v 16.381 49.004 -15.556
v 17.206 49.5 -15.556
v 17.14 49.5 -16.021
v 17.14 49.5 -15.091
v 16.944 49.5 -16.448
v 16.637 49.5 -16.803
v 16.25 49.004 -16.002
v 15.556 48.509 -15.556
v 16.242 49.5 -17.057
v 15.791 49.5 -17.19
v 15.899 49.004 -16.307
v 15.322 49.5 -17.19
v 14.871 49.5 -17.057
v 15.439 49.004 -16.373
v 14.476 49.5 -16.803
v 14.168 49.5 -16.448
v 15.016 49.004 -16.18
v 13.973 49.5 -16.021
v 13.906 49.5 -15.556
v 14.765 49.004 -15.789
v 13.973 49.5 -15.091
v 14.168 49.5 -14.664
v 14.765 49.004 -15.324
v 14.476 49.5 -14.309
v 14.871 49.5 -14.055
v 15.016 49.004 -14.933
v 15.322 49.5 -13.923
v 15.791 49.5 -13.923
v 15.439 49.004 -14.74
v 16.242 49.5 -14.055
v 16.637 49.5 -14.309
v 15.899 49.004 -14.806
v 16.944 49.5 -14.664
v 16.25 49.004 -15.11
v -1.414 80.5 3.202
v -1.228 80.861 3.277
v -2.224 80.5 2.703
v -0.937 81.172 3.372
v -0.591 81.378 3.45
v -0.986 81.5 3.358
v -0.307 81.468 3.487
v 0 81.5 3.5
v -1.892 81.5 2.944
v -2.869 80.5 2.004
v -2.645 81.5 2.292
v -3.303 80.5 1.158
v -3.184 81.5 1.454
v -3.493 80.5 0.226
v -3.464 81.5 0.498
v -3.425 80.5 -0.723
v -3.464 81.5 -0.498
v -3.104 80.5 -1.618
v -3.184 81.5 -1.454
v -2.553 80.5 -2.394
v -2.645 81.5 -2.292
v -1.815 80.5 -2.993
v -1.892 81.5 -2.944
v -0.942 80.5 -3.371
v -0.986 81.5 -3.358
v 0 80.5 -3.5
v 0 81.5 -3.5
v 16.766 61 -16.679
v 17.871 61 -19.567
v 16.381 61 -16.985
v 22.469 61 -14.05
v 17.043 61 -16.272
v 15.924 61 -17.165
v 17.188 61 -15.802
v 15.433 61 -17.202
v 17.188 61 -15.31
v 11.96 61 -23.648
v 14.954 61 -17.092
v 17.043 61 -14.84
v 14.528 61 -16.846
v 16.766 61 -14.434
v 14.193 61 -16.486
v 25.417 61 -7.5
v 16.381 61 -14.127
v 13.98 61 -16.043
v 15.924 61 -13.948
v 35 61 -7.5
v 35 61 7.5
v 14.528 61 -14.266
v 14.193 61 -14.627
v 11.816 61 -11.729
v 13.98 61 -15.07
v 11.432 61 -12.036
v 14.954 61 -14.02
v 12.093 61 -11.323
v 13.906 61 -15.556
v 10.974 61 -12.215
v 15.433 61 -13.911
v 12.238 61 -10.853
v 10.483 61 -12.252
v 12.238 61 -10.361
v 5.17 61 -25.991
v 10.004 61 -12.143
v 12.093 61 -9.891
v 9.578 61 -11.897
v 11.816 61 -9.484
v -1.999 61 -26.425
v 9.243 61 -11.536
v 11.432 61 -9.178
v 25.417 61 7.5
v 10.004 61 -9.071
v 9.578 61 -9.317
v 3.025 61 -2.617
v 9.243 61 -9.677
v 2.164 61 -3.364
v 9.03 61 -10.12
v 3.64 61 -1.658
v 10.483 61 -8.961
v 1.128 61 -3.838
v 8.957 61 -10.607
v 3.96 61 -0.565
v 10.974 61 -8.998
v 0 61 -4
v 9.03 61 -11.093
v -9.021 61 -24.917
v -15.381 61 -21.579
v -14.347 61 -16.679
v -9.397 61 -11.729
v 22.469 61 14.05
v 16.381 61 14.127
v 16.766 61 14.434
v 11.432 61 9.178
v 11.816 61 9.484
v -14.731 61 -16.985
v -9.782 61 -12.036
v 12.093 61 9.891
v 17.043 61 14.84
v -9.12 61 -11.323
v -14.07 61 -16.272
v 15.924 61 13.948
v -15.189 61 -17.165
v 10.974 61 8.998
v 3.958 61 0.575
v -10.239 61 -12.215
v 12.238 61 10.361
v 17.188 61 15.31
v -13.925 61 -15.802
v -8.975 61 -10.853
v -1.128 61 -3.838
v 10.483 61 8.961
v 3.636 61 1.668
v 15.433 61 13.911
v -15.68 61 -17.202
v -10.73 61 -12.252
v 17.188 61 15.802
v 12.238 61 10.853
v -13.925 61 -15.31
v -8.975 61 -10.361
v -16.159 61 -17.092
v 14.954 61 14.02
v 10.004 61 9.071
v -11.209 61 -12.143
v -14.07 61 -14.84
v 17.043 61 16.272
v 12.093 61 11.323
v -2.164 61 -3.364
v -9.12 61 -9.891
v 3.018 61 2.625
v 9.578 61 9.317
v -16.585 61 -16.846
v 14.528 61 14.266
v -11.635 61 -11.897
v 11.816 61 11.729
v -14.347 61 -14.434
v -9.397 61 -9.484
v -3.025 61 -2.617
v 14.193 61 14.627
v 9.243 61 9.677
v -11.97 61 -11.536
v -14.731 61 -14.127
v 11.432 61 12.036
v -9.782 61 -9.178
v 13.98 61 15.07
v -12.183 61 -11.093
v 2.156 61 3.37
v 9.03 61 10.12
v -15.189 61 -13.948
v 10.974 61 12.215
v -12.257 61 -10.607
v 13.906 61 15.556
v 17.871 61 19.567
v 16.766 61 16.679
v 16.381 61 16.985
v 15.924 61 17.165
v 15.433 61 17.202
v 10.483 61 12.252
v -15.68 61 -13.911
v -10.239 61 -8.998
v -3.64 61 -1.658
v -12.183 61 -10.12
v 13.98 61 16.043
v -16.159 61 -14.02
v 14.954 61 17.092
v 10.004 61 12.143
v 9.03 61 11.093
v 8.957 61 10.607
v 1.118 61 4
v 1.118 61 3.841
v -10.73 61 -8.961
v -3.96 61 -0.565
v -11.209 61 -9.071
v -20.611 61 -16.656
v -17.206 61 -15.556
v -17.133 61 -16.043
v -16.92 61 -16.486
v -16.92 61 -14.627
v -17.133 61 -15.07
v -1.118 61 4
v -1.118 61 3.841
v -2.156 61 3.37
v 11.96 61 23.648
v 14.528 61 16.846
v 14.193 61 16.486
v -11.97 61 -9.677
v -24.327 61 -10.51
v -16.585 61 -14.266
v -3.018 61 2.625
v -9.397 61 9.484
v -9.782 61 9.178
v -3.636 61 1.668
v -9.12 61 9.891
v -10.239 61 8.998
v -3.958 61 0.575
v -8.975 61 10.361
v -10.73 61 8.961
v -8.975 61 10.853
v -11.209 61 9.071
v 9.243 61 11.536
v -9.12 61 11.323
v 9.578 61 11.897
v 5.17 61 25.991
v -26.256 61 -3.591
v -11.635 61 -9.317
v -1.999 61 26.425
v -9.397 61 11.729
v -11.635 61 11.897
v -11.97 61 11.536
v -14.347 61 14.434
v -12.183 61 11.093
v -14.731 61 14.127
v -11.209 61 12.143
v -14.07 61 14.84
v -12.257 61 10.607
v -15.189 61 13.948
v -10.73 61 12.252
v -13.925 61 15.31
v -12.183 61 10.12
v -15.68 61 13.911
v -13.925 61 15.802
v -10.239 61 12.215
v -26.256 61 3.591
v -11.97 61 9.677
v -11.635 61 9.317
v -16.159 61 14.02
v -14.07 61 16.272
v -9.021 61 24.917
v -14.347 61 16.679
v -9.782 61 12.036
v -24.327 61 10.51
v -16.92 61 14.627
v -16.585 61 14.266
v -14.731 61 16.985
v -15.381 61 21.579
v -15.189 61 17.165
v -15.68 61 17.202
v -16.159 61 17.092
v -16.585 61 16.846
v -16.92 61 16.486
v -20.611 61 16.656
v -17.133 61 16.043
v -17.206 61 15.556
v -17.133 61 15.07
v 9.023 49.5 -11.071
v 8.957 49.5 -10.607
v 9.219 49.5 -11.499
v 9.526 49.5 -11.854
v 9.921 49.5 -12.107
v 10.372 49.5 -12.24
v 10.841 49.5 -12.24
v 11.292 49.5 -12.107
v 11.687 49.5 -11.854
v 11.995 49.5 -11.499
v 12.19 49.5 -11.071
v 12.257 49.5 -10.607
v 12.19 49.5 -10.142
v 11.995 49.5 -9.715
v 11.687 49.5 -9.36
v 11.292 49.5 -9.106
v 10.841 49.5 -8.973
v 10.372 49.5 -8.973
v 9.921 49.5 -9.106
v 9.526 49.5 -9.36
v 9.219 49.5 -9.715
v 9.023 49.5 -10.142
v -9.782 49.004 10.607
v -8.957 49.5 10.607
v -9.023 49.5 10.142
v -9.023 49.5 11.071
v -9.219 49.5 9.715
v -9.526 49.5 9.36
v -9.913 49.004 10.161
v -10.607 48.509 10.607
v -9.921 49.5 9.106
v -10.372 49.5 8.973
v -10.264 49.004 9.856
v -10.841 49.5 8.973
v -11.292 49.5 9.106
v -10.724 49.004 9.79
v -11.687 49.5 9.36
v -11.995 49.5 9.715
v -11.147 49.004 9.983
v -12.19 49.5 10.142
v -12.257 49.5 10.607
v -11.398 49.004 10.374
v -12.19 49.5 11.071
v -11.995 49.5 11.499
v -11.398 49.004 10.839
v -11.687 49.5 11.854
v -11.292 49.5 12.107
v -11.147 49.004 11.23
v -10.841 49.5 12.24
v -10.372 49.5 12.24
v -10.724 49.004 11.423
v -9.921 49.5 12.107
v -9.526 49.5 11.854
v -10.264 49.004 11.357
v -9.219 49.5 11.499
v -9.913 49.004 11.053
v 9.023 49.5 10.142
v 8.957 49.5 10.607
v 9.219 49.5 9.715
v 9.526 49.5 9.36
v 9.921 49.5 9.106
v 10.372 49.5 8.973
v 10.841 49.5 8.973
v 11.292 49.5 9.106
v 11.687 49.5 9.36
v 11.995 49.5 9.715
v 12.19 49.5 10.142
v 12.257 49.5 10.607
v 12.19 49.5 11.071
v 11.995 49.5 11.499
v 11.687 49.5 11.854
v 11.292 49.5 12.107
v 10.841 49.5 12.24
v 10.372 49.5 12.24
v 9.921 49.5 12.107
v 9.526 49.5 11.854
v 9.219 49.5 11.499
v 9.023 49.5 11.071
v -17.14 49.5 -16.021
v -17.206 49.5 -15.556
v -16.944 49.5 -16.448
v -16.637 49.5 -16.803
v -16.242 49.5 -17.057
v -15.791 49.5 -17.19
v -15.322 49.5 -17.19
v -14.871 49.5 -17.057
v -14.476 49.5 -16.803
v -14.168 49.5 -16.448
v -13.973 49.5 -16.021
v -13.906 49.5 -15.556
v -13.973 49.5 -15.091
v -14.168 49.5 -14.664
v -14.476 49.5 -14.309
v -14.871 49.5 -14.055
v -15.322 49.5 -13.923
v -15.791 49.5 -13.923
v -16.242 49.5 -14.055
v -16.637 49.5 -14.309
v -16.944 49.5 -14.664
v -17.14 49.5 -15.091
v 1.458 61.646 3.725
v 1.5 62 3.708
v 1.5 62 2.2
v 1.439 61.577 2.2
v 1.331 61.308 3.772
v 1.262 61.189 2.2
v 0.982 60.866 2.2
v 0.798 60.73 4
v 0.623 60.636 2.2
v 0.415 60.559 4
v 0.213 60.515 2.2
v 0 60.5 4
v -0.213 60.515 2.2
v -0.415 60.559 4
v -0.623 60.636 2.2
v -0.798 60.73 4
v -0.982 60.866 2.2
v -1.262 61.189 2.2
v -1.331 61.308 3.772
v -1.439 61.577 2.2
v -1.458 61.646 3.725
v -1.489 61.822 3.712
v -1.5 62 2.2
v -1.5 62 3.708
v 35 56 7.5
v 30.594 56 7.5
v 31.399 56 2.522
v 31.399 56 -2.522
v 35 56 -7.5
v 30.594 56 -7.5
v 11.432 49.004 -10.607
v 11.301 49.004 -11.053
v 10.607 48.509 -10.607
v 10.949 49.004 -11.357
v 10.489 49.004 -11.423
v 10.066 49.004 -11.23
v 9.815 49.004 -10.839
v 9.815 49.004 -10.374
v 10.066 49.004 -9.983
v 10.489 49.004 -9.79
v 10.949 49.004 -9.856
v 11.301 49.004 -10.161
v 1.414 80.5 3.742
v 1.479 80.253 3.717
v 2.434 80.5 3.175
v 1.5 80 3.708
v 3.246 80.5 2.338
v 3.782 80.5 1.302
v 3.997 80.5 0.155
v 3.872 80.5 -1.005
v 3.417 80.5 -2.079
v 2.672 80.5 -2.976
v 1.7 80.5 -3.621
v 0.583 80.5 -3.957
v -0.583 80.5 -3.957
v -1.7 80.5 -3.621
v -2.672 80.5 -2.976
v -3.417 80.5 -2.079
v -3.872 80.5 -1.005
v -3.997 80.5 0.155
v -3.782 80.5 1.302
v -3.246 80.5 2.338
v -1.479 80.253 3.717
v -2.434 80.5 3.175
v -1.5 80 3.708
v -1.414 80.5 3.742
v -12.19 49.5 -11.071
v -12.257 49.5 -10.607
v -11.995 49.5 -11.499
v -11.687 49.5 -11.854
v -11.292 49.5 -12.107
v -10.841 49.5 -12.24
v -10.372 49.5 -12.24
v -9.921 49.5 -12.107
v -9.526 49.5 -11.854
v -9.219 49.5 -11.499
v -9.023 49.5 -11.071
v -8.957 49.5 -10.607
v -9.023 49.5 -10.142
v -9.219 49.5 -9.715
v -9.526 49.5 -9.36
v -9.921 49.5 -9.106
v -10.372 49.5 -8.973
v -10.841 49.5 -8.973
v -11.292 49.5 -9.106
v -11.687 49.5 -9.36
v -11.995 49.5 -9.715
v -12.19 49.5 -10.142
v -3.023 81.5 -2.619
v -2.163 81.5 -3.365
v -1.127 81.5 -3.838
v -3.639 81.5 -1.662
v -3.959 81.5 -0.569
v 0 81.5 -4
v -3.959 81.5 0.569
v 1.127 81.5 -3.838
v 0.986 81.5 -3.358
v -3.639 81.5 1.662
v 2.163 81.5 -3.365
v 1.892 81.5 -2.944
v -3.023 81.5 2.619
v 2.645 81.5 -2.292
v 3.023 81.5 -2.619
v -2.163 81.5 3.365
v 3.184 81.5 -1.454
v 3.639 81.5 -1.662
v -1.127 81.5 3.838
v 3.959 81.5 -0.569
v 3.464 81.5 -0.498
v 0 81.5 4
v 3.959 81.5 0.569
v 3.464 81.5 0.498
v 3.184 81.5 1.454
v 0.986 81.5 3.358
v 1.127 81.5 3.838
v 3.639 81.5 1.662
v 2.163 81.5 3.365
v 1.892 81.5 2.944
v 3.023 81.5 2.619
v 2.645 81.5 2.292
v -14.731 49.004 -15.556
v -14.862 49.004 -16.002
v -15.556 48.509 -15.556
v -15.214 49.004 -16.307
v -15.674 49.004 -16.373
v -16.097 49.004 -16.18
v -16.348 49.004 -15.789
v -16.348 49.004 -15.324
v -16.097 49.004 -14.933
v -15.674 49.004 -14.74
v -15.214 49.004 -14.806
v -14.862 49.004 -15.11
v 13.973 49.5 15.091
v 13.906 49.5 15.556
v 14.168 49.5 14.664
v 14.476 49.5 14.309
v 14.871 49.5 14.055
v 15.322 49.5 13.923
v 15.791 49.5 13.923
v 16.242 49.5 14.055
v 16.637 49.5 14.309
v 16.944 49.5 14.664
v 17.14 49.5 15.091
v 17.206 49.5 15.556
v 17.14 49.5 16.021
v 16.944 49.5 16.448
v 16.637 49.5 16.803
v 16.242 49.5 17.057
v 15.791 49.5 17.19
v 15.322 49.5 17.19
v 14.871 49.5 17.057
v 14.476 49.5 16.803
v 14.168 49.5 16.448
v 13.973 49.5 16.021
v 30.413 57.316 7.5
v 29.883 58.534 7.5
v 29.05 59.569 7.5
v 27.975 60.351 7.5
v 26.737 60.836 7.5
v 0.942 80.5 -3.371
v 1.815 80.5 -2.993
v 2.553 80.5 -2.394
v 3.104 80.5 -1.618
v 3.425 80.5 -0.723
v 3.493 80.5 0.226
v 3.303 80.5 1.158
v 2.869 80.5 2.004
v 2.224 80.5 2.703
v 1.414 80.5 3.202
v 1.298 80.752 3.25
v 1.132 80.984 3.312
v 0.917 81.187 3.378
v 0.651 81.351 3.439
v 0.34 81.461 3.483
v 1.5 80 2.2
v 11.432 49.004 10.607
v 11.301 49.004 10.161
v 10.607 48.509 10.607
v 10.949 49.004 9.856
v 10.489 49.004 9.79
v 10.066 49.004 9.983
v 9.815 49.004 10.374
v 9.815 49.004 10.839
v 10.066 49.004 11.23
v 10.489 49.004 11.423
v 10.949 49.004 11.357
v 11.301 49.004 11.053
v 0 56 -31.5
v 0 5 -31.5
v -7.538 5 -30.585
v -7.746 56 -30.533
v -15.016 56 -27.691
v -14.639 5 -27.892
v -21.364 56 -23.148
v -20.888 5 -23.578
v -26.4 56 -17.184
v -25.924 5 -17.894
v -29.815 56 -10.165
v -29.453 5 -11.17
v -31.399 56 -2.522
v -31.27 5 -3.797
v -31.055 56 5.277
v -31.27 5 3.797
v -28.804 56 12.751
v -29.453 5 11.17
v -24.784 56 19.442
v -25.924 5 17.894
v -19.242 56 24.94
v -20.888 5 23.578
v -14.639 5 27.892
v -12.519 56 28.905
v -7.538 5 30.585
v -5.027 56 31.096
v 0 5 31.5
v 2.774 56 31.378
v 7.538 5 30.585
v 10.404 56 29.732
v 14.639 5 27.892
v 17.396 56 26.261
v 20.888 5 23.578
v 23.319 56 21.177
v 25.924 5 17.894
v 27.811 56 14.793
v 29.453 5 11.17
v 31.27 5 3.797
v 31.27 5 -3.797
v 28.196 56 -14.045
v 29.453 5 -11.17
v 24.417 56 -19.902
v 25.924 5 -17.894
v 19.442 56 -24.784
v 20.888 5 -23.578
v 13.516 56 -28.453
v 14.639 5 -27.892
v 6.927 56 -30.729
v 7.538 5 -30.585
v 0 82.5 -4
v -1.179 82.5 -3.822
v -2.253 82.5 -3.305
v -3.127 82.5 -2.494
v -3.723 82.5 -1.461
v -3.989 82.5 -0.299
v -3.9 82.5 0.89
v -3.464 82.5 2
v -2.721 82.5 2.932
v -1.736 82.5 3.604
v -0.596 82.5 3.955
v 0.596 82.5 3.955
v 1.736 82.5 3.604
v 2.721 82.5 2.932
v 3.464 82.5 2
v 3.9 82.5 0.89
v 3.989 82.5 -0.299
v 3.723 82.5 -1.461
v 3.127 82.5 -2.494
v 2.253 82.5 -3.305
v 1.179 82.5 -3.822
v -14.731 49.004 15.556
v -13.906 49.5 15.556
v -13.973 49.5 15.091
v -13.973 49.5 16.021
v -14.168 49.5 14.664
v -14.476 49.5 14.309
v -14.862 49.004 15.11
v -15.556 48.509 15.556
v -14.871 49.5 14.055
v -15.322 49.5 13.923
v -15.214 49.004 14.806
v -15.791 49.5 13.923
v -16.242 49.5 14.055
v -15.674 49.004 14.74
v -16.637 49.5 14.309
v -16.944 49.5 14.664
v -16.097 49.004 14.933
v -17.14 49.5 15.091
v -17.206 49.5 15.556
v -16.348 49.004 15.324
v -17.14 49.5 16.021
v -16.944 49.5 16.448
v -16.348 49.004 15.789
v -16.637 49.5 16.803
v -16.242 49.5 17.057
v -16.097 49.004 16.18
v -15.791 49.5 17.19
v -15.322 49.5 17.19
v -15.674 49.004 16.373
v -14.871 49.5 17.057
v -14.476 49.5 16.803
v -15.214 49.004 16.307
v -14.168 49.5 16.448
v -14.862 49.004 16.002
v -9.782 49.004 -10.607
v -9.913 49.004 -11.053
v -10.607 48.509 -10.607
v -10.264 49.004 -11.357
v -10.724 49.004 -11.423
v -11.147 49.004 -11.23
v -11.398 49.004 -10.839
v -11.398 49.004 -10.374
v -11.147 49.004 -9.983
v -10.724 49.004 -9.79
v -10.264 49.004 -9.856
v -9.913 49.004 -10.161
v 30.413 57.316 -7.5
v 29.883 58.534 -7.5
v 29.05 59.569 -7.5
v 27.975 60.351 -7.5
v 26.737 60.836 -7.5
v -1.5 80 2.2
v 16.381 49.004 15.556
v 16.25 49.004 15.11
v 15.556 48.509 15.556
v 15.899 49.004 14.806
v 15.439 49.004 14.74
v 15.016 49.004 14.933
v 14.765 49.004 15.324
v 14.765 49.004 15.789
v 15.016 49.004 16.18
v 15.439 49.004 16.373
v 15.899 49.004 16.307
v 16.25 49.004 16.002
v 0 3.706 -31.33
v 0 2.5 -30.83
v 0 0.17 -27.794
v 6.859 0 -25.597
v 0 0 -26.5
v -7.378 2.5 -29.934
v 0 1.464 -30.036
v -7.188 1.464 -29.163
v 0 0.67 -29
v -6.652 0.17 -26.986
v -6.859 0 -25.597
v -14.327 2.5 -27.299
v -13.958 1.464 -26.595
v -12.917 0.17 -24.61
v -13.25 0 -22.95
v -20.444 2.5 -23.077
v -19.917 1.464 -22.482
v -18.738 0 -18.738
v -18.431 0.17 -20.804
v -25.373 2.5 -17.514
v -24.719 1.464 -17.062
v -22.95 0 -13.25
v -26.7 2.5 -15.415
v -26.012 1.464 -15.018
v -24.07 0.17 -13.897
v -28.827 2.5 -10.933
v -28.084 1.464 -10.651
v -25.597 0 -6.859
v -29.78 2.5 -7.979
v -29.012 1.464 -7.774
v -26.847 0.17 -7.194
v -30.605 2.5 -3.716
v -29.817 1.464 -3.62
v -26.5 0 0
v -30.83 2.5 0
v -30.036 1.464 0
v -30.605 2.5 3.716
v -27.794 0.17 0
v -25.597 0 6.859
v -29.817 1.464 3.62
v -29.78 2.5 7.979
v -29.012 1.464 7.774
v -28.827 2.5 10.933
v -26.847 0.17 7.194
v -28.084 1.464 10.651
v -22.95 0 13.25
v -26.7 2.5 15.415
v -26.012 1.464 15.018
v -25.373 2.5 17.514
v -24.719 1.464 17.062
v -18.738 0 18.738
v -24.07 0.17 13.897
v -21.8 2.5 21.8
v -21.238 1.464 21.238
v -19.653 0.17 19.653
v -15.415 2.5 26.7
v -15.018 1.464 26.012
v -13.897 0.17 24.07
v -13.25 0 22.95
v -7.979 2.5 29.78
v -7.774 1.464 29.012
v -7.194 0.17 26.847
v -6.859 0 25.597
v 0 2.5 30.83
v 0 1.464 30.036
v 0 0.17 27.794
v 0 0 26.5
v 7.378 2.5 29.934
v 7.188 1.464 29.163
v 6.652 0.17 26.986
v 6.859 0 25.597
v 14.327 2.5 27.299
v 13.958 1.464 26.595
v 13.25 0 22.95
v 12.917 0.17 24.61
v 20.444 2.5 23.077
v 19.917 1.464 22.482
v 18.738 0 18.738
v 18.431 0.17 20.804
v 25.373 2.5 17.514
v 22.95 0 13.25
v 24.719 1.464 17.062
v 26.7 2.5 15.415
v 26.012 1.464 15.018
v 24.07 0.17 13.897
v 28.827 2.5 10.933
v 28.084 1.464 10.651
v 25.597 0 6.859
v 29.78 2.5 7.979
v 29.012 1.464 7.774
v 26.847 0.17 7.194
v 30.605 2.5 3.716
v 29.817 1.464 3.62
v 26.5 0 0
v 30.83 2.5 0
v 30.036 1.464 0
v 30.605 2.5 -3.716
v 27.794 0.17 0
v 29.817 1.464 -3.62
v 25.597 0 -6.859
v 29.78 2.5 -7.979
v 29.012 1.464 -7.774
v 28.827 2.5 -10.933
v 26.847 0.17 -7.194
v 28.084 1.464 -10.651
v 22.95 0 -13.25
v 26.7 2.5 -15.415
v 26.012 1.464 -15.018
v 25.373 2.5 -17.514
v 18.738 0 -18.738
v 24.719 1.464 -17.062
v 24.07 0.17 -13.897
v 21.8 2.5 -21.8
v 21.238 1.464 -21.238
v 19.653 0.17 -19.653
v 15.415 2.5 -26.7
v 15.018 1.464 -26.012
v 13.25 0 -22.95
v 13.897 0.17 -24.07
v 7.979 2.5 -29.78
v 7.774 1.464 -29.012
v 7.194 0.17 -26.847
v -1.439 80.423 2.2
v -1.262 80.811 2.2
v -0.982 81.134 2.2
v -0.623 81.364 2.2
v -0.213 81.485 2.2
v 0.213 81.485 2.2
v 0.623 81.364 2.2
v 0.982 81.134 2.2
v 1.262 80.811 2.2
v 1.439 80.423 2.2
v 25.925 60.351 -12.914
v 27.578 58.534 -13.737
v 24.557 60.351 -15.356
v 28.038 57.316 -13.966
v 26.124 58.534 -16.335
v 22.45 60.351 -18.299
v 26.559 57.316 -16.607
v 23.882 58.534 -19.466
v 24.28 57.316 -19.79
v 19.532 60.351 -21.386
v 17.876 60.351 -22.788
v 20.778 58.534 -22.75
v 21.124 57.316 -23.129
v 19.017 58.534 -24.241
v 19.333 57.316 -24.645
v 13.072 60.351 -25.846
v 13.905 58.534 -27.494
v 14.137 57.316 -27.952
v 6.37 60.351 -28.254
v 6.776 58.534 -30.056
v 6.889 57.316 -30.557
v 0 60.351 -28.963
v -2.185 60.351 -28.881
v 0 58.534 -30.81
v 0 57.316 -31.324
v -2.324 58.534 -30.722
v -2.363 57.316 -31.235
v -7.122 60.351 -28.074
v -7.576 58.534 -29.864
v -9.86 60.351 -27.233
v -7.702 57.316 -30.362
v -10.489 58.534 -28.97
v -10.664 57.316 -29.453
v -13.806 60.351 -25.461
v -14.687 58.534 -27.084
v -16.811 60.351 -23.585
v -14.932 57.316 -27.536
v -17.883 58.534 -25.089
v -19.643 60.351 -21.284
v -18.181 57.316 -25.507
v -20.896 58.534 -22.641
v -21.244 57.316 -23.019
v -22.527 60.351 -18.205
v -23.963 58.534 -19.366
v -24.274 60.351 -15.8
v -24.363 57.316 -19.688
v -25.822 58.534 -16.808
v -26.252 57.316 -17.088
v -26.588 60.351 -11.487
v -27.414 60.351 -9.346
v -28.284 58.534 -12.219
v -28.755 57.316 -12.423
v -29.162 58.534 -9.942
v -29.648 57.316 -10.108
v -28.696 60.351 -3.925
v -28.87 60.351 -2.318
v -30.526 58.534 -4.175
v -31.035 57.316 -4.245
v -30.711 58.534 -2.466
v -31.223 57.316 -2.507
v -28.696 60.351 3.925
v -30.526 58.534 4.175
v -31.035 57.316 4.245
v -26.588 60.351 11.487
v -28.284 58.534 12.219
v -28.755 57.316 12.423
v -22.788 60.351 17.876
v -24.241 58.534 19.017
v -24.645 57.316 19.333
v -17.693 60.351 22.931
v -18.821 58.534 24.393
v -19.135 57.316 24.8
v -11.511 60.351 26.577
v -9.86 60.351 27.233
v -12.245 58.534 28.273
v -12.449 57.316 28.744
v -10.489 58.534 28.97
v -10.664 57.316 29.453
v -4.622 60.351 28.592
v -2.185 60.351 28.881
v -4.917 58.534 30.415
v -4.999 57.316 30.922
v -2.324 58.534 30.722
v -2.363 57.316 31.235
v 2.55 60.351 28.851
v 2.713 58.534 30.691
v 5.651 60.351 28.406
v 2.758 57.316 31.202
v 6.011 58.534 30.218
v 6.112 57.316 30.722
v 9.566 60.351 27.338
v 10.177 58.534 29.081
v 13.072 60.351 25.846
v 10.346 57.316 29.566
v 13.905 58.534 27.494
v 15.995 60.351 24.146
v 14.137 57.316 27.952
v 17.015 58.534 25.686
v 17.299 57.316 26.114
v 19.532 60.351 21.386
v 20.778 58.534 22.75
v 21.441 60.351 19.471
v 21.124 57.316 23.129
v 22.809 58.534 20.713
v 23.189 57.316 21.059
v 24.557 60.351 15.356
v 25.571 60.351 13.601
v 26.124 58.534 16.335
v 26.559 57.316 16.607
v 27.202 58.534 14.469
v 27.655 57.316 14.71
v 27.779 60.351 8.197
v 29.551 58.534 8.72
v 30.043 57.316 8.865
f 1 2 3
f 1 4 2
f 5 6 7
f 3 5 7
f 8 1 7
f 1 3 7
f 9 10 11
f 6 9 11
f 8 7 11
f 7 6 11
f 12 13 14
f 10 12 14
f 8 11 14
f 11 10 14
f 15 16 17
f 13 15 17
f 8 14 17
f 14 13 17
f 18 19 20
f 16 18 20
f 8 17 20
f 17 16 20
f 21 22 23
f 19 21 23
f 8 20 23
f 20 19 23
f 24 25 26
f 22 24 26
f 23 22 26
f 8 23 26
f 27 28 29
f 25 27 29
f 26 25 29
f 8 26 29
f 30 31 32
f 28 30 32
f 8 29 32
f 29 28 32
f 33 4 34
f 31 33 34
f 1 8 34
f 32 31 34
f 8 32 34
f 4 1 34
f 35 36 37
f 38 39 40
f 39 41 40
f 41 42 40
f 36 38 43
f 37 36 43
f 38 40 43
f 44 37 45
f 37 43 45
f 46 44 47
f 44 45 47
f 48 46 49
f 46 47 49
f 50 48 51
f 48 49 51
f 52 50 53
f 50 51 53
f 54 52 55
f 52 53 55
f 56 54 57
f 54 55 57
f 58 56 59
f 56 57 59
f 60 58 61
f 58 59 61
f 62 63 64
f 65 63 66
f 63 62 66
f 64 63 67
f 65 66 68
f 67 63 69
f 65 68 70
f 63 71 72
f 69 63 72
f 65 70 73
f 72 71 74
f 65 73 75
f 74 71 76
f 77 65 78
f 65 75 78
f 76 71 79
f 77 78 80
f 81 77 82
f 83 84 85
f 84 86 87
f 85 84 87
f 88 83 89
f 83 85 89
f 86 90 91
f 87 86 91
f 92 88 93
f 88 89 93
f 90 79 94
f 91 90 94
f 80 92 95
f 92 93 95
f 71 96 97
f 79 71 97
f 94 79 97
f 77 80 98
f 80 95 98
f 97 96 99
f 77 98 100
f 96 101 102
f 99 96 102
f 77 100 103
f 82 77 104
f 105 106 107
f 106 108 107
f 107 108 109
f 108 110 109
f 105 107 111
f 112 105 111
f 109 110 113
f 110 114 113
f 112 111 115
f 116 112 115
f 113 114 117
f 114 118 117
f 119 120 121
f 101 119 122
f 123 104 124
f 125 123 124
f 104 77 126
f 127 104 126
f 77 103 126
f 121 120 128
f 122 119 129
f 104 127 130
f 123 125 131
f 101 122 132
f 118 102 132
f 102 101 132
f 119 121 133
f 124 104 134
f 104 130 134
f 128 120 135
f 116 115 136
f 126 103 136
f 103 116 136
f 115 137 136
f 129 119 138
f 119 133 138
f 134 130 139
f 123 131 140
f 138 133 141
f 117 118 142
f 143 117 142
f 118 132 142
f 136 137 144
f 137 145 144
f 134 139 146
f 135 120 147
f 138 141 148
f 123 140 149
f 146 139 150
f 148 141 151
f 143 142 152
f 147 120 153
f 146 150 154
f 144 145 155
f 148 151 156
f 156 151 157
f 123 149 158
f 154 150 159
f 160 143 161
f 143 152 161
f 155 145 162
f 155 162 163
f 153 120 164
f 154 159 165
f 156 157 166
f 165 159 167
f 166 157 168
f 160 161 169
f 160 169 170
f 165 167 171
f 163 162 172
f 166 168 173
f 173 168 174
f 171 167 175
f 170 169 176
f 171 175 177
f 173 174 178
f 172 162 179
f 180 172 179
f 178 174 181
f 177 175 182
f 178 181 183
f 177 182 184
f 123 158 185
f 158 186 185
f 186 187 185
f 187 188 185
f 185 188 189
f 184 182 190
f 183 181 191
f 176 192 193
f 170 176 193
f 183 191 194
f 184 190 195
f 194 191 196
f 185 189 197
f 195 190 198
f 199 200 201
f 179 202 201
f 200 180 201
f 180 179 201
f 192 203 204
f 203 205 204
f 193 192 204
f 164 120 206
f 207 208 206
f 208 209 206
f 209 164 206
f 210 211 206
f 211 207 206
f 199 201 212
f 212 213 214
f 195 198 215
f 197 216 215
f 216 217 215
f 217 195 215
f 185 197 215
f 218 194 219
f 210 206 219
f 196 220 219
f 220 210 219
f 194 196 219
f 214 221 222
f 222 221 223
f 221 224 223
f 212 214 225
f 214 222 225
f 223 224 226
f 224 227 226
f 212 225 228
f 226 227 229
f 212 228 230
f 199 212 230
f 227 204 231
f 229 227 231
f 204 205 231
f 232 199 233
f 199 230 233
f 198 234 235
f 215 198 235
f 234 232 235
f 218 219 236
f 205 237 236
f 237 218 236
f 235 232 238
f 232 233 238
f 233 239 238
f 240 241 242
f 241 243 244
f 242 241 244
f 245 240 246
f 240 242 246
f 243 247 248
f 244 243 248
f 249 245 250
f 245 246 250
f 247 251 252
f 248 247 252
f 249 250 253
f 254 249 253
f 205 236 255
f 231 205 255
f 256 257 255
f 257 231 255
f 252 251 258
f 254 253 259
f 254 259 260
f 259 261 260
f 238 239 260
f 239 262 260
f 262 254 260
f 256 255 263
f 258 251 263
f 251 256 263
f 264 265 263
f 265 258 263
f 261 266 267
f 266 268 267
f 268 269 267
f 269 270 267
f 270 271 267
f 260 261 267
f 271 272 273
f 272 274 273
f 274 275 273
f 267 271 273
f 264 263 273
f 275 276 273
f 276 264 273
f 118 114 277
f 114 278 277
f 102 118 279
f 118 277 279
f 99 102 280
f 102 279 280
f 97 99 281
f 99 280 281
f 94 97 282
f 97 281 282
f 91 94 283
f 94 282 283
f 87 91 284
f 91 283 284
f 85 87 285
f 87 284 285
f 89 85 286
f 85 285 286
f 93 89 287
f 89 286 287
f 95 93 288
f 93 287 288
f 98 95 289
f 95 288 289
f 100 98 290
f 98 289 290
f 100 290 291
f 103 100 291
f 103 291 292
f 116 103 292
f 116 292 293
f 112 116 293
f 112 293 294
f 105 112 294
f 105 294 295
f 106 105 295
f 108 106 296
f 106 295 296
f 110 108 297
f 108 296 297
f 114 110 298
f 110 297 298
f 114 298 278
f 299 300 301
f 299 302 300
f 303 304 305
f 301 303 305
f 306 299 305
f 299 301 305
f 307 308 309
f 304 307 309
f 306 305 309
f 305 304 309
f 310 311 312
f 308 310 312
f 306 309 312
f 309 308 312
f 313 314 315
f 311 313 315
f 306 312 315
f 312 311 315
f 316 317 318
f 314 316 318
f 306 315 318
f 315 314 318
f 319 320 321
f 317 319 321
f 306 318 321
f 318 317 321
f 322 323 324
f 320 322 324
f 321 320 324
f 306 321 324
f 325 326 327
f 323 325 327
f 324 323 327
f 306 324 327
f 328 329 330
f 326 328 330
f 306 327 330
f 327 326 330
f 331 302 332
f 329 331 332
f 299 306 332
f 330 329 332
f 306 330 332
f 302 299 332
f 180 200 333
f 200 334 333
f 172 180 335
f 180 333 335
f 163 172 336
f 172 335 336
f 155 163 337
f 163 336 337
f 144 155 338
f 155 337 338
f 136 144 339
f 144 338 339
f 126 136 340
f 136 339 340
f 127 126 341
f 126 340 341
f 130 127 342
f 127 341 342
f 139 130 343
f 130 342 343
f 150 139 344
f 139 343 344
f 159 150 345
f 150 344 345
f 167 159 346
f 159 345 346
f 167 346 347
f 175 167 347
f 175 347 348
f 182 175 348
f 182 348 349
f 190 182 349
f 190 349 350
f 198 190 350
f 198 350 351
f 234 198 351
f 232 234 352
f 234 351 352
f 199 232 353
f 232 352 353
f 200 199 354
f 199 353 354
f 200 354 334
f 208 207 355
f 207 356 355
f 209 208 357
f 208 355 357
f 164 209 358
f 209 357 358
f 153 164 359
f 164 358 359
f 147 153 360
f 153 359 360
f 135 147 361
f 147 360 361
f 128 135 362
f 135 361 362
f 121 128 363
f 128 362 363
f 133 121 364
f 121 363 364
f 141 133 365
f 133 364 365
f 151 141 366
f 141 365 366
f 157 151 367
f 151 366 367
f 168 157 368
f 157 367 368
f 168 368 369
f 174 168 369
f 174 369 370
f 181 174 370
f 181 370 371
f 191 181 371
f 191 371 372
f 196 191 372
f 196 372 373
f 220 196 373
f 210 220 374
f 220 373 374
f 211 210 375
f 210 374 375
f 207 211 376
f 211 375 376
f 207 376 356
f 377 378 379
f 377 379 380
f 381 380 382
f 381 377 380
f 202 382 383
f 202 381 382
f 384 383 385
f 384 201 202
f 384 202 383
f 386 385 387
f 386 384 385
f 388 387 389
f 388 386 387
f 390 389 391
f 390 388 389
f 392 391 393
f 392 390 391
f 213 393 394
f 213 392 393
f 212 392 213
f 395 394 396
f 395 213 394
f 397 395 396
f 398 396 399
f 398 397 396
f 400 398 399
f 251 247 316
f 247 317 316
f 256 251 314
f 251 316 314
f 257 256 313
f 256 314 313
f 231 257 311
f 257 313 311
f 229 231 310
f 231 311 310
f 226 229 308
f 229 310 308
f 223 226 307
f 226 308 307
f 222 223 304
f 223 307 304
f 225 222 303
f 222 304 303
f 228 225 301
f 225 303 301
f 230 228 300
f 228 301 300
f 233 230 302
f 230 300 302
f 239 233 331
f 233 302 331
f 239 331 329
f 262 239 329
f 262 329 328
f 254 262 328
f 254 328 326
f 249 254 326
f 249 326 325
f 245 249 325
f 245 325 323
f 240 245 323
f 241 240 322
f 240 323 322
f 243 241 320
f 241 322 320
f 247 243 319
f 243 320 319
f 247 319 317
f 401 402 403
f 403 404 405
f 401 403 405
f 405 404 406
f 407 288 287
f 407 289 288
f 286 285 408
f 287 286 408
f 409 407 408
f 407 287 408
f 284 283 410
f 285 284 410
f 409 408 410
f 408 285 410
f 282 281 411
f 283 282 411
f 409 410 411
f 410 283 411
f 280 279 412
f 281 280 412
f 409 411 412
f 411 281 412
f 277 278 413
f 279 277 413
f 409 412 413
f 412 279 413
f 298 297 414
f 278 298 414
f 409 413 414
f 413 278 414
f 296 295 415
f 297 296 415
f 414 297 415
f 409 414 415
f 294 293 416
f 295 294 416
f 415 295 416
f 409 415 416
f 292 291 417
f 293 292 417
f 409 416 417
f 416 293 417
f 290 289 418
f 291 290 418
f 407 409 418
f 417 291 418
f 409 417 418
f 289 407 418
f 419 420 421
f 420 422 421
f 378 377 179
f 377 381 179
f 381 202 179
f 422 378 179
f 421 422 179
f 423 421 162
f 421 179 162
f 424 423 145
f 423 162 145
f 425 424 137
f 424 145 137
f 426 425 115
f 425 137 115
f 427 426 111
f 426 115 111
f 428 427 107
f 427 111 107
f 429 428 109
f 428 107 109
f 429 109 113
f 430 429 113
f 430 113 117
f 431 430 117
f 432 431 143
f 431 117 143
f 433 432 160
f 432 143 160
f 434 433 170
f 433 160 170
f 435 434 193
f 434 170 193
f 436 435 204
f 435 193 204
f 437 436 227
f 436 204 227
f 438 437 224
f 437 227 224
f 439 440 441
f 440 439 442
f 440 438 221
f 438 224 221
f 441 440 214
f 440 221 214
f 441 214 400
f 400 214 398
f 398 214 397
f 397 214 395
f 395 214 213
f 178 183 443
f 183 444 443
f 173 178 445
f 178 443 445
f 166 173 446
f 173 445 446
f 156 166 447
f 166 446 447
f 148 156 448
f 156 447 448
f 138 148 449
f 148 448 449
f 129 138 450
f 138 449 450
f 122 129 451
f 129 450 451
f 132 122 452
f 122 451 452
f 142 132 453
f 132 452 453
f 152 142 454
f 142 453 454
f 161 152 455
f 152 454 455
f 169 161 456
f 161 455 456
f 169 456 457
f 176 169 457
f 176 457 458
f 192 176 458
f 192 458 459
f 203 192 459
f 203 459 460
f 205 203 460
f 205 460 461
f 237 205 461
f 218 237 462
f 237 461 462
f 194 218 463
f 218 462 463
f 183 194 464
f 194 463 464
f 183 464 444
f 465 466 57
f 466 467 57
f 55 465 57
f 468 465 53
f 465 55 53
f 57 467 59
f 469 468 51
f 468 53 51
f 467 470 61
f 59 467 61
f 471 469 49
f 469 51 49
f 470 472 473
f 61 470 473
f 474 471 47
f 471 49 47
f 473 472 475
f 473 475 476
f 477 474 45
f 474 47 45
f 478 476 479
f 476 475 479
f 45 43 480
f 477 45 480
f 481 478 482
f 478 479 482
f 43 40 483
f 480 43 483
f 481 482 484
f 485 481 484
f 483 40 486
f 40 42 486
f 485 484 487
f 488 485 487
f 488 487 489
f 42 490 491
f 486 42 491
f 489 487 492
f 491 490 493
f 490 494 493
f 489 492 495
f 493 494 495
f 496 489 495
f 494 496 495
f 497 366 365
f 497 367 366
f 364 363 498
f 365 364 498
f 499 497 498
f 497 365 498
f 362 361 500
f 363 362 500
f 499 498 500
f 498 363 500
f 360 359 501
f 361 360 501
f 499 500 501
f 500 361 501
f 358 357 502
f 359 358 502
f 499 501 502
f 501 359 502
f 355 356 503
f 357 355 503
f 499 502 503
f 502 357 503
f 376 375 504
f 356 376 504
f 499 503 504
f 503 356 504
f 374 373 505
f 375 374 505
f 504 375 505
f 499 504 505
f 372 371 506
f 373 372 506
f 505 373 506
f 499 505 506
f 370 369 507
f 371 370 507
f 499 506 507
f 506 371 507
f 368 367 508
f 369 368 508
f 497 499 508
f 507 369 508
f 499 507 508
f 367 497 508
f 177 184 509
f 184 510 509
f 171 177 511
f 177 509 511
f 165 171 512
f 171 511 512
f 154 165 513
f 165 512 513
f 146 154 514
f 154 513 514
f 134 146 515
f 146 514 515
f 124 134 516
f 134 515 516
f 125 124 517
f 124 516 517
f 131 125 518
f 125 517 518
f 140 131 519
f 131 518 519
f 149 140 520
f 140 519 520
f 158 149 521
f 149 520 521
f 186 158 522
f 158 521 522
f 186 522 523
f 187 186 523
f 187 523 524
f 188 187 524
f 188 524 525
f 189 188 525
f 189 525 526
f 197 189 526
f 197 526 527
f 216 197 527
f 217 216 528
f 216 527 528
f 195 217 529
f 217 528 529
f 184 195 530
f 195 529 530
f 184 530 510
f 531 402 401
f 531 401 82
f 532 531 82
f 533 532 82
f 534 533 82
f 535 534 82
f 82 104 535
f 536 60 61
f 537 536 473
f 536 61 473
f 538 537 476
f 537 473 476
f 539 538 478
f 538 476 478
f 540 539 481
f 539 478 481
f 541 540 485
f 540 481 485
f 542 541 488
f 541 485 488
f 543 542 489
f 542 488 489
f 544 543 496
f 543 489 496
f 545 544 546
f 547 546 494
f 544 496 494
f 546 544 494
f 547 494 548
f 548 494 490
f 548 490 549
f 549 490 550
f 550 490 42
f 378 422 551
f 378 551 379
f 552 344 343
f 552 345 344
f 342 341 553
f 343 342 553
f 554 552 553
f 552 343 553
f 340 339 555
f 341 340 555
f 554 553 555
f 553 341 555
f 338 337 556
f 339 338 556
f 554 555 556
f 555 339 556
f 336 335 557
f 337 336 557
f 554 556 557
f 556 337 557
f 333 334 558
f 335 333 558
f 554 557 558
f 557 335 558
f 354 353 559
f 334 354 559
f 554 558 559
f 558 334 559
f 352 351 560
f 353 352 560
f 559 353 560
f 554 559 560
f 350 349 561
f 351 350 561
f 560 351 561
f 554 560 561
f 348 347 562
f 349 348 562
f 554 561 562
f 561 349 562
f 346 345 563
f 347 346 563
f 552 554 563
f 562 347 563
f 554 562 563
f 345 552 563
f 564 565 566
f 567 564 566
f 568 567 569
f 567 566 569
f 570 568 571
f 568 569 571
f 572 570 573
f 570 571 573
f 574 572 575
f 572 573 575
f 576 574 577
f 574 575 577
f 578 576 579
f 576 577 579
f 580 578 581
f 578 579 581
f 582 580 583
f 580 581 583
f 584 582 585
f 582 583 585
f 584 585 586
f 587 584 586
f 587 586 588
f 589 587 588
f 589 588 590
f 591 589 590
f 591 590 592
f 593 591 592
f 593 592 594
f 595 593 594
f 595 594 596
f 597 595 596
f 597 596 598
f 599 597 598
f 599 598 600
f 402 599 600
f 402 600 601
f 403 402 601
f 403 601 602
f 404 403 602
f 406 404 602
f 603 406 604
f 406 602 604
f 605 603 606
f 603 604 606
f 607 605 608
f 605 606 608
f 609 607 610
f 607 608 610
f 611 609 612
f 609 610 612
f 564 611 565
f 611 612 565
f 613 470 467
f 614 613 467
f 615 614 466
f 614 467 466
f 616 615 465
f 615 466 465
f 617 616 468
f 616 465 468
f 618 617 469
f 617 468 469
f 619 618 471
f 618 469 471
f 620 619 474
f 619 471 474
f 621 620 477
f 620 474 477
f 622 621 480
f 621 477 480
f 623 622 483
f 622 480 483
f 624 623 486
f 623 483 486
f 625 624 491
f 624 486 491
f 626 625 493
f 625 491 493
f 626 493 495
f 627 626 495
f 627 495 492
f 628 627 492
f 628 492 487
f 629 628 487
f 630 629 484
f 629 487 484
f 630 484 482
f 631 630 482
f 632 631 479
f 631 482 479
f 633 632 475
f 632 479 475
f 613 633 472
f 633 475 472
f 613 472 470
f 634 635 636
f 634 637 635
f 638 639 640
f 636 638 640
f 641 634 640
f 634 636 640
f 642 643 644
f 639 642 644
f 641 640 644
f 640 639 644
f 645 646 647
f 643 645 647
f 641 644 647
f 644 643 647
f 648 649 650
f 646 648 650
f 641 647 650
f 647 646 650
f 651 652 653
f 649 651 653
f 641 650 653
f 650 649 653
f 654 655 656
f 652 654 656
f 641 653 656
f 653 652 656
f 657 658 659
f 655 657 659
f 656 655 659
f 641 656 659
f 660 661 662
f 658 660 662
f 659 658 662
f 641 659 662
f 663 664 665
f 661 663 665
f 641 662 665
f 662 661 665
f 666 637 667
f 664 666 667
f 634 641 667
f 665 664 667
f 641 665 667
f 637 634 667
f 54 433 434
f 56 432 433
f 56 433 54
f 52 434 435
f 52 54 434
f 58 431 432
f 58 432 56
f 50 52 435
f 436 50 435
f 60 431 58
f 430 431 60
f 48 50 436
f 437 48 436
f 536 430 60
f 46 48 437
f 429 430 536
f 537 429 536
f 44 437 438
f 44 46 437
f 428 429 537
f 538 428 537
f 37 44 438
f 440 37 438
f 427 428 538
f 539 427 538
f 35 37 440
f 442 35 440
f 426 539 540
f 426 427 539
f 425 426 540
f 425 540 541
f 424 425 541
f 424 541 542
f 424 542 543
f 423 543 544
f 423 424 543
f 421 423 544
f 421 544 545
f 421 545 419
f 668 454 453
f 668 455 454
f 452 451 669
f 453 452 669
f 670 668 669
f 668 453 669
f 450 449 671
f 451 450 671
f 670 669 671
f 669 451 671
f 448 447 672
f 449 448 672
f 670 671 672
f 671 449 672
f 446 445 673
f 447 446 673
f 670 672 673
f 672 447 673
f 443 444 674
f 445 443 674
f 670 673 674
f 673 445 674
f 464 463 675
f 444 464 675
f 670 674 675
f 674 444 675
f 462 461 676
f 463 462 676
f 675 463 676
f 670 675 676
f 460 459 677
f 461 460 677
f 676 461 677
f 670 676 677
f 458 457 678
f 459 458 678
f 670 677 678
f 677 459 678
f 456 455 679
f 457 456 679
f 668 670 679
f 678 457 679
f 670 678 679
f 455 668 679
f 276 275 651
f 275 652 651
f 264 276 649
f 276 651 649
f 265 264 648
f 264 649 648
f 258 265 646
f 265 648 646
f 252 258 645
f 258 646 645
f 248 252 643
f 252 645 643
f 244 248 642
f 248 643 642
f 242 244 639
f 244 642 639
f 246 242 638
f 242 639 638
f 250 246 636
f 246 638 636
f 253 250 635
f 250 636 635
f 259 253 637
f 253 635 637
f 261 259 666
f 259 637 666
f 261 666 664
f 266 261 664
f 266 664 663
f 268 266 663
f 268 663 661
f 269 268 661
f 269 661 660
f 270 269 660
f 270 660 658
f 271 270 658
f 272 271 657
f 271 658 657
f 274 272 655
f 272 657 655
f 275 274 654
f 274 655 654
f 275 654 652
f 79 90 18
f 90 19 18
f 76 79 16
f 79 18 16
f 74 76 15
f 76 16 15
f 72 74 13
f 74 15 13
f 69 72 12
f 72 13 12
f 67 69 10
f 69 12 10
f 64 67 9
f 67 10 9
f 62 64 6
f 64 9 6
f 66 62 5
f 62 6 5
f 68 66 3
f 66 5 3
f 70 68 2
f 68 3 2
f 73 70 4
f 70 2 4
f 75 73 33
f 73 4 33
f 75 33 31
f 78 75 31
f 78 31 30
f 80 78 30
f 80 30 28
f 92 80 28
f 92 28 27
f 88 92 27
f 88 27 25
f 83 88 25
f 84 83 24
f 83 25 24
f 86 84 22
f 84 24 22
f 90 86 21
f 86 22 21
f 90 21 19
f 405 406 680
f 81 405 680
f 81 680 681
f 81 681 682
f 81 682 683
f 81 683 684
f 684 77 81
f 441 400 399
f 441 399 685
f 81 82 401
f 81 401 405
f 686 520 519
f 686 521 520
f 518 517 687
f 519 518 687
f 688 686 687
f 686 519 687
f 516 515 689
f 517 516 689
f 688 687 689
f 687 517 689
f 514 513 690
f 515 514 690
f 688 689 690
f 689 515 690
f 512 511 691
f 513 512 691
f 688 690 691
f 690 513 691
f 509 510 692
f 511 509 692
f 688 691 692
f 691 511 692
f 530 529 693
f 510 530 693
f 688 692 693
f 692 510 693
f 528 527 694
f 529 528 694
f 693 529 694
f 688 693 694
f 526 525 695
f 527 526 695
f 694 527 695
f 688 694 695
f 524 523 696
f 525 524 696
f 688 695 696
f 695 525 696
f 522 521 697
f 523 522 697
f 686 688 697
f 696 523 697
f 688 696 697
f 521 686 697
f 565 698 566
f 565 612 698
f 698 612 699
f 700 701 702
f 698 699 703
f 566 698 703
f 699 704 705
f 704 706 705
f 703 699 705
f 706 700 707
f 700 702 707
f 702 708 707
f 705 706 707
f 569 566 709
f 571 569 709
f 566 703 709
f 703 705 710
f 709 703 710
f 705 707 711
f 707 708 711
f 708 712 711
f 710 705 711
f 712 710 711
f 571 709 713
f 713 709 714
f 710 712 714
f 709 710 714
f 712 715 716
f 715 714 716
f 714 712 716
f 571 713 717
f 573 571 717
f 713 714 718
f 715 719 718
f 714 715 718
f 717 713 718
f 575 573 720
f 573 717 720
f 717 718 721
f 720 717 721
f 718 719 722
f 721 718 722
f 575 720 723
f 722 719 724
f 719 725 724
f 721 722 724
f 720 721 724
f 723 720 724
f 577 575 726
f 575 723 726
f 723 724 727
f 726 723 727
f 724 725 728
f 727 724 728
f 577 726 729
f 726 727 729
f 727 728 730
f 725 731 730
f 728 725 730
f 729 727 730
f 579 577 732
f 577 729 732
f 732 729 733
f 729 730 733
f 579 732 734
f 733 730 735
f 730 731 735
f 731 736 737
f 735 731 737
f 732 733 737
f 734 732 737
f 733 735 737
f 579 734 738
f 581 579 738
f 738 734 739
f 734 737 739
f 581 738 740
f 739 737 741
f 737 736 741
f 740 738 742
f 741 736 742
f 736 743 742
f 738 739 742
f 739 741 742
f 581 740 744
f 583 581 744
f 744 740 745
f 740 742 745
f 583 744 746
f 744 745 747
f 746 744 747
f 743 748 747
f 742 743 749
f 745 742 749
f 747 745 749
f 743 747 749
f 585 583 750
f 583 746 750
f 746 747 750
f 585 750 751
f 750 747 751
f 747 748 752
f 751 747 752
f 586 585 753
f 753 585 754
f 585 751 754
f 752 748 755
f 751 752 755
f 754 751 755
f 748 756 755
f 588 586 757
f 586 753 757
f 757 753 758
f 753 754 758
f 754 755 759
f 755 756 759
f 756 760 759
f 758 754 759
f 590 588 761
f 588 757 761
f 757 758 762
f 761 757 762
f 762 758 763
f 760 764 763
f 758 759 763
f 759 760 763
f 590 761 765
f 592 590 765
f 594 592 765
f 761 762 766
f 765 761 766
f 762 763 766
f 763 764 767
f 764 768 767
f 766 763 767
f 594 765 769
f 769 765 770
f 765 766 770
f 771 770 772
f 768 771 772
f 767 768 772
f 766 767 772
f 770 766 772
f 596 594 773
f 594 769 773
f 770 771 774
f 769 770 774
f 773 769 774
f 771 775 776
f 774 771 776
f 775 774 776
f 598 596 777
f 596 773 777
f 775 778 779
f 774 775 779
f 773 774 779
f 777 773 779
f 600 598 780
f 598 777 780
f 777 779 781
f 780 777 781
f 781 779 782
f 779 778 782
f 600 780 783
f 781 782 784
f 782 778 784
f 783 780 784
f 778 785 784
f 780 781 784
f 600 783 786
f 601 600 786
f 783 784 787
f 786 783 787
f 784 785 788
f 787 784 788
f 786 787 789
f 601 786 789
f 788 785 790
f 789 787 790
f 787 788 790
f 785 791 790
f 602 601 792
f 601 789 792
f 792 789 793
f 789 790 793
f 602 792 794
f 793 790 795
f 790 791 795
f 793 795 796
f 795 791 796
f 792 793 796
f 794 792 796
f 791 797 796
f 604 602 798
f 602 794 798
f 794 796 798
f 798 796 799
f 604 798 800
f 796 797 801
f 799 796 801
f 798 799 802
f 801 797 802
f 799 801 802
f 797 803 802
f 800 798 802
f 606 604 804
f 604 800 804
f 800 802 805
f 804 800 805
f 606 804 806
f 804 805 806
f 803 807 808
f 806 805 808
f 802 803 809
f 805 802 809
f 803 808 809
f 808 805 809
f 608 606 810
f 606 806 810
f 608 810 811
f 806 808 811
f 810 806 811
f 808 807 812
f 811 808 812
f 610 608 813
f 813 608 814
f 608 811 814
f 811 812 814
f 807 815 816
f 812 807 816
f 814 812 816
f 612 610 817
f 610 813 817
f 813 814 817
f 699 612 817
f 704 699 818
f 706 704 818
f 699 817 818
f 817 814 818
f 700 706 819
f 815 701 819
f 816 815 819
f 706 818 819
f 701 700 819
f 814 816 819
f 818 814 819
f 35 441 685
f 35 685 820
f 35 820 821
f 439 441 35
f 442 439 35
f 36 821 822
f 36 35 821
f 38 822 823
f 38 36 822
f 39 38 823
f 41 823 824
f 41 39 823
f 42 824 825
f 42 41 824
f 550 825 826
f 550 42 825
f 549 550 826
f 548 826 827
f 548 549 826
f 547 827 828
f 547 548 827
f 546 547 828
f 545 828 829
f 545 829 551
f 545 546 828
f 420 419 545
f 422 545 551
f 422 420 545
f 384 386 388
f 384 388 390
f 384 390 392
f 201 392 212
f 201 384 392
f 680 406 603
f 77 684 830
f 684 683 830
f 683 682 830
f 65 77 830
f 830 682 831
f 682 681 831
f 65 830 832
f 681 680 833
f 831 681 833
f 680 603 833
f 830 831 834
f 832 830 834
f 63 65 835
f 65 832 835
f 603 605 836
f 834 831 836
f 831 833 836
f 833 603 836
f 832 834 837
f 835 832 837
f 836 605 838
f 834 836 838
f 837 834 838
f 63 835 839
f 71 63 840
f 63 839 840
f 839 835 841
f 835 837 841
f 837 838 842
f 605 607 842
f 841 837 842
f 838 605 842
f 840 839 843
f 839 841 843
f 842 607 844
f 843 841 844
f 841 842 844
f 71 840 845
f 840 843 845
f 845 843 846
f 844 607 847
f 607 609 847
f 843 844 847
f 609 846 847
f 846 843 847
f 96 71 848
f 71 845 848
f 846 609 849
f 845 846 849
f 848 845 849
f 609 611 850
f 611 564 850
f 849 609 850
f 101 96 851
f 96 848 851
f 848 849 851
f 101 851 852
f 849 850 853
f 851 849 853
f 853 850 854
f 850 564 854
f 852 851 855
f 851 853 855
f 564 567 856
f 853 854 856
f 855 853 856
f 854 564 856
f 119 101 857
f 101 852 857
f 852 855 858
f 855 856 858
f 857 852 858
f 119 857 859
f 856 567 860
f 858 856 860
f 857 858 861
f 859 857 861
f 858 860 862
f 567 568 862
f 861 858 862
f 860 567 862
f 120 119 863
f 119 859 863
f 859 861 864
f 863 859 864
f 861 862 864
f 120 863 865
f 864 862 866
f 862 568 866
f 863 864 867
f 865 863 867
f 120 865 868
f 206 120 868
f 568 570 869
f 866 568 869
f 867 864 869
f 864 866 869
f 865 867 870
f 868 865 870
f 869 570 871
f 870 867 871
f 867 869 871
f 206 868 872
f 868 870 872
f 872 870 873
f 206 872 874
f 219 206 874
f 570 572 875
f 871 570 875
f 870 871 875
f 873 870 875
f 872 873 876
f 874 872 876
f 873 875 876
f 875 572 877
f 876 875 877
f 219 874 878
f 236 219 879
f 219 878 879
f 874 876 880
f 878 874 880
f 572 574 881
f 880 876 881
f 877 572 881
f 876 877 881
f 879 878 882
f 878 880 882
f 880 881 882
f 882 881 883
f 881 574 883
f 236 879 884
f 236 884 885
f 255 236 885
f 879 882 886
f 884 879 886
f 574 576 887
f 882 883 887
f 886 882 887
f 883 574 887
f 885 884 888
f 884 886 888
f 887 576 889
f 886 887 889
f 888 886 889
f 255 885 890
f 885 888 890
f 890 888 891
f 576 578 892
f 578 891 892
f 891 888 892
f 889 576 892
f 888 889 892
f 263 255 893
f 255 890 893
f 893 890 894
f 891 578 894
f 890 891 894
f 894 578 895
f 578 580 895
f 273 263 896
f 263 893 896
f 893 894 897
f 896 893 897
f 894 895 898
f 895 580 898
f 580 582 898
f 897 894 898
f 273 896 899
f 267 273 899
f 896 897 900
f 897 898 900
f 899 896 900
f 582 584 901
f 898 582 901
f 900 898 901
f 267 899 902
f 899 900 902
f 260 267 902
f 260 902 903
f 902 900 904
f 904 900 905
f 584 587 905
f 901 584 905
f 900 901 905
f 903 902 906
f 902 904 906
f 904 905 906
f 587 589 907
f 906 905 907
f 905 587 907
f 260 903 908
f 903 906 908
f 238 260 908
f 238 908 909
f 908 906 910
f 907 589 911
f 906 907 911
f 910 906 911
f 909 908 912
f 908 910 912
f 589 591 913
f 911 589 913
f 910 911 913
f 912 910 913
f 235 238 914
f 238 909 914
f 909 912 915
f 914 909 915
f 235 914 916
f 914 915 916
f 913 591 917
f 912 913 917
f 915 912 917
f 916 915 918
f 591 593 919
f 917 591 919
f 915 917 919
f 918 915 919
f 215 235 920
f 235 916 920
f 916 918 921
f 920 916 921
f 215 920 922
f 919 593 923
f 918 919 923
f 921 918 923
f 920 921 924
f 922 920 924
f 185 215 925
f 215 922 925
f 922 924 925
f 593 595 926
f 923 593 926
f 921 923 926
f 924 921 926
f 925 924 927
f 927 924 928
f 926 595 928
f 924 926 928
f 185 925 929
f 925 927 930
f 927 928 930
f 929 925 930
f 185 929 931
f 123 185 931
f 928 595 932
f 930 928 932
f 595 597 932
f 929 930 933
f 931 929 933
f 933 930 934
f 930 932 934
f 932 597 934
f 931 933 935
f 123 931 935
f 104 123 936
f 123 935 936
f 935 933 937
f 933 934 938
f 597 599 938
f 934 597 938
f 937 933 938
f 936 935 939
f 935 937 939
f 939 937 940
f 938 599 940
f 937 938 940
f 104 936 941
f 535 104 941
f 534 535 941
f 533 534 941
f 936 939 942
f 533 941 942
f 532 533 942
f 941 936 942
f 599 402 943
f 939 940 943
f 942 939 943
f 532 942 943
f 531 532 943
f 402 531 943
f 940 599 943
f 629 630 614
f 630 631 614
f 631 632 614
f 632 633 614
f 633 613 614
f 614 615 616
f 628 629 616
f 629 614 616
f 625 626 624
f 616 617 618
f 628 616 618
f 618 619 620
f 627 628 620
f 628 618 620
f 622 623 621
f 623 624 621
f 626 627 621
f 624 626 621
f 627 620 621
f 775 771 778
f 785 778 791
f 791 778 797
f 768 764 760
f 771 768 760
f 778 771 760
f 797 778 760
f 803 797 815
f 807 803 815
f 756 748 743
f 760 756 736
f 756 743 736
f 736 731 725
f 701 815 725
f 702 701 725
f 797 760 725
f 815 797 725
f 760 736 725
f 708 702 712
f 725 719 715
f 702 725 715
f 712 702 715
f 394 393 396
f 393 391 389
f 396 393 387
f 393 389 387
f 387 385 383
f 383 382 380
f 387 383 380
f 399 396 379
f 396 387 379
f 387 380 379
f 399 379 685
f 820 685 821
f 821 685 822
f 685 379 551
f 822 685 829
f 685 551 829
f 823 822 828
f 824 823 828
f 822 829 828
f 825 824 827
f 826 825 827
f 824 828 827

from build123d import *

# Parameters (mm, degrees)
FILLET_1_R         = 5
SKETCH_3_W         = 15
SKETCH_3_H         = 5
EXTRUDE_1_DEPTH    = 35
M4X0_7_1_D         = 3.3
M4X0_7_1_DEPTH     = 11.5
M4X0_7_1_TIP       = 0.991420021
SKETCH_6_W         = 0.5
SKETCH_6_H         = 1
CUT_EXTRUDE1_DEPTH = 1.8


with BuildPart() as part:
    # 스케치1 → 회전1 (revolve)
    with BuildSketch(Plane.XY, mode=Mode.PRIVATE) as revolve_1_sk:
        Polygon((0, 82.5), (4, 82.5), (4, 61), (31.5, 61), (31.5, 0), (0, 0), align=None)
    revolve(revolve_1_sk.sketch.rotate(Axis((0, 0, 0), (0, 1, 0)), 90), axis=Axis((0, 0, 0), (0, 1, 0)))

    # 필렛1
    fillet_1_edges = [part.edges().sort_by_distance(p)[0] for p in [
        (0, 0, 31.5),
        (0, 61, 31.5),
    ]]
    fillet(fillet_1_edges, radius=FILLET_1_R)

    # 스케치3 → 보스-돌출1 (add)
    with BuildSketch(Plane(origin=(0, 0, 0), x_dir=(0, 0, -1), z_dir=(1, 0, 0))):
        with Locations((0, 58.5)):
            Rectangle(SKETCH_3_W, SKETCH_3_H)
    extrude(amount=EXTRUDE_1_DEPTH)

    # M4x0.7 나사 구멍1
    with Locations(Plane(origin=(0, 61, 0), x_dir=(1, 0, 0), z_dir=(0, 1, 0))):
        with Locations((10.606601718, 10.606601718), (15.556349186, 15.556349186), (10.606601718, -10.606601718), (15.556349186, -15.556349186), (-10.606601718, -10.606601718), (-15.556349186, -15.556349186), (-10.606601718, 10.606601718), (-15.556349186, 15.556349186)):
            Hole(M4X0_7_1_D / 2, depth=M4X0_7_1_DEPTH)
            with Locations((0, 0, -(M4X0_7_1_DEPTH + M4X0_7_1_TIP / 2))):  # 118° drill point
                Cone(0, M4X0_7_1_D / 2, M4X0_7_1_TIP, mode=Mode.SUBTRACT)

    # 스케치6 → 컷-회전1 (revolve, cut)
    with BuildSketch(Plane(origin=(0, 0, 0), x_dir=(0, 0, -1), z_dir=(1, 0, 0))):
        with Locations((3.75, 81)):
            Rectangle(SKETCH_6_W, SKETCH_6_H)
    revolve(axis=Axis((0, 82.5, 0), (0, -1, 0)), mode=Mode.SUBTRACT)

    # Sketch3 → Cut-Extrude1 (cut)
    with BuildSketch(Plane(origin=(2.845698698, 82.5, 4), x_dir=(0, 1, 0), z_dir=(0, 0, -1))):
        with BuildLine():
            Line((-2.5, -1.345698698), (-20.5, -1.345698698))
            ThreePointArc((-20.5, -1.345698698), (-22, -2.845698698), (-20.5, -4.345698698))
            Line((-20.5, -4.345698698), (-2.5, -4.345698698))
            ThreePointArc((-2.5, -4.345698698), (-1, -2.845698698), (-2.5, -1.345698698))
        make_face()
    extrude(amount=CUT_EXTRUDE1_DEPTH, mode=Mode.SUBTRACT)


solid = part.part
